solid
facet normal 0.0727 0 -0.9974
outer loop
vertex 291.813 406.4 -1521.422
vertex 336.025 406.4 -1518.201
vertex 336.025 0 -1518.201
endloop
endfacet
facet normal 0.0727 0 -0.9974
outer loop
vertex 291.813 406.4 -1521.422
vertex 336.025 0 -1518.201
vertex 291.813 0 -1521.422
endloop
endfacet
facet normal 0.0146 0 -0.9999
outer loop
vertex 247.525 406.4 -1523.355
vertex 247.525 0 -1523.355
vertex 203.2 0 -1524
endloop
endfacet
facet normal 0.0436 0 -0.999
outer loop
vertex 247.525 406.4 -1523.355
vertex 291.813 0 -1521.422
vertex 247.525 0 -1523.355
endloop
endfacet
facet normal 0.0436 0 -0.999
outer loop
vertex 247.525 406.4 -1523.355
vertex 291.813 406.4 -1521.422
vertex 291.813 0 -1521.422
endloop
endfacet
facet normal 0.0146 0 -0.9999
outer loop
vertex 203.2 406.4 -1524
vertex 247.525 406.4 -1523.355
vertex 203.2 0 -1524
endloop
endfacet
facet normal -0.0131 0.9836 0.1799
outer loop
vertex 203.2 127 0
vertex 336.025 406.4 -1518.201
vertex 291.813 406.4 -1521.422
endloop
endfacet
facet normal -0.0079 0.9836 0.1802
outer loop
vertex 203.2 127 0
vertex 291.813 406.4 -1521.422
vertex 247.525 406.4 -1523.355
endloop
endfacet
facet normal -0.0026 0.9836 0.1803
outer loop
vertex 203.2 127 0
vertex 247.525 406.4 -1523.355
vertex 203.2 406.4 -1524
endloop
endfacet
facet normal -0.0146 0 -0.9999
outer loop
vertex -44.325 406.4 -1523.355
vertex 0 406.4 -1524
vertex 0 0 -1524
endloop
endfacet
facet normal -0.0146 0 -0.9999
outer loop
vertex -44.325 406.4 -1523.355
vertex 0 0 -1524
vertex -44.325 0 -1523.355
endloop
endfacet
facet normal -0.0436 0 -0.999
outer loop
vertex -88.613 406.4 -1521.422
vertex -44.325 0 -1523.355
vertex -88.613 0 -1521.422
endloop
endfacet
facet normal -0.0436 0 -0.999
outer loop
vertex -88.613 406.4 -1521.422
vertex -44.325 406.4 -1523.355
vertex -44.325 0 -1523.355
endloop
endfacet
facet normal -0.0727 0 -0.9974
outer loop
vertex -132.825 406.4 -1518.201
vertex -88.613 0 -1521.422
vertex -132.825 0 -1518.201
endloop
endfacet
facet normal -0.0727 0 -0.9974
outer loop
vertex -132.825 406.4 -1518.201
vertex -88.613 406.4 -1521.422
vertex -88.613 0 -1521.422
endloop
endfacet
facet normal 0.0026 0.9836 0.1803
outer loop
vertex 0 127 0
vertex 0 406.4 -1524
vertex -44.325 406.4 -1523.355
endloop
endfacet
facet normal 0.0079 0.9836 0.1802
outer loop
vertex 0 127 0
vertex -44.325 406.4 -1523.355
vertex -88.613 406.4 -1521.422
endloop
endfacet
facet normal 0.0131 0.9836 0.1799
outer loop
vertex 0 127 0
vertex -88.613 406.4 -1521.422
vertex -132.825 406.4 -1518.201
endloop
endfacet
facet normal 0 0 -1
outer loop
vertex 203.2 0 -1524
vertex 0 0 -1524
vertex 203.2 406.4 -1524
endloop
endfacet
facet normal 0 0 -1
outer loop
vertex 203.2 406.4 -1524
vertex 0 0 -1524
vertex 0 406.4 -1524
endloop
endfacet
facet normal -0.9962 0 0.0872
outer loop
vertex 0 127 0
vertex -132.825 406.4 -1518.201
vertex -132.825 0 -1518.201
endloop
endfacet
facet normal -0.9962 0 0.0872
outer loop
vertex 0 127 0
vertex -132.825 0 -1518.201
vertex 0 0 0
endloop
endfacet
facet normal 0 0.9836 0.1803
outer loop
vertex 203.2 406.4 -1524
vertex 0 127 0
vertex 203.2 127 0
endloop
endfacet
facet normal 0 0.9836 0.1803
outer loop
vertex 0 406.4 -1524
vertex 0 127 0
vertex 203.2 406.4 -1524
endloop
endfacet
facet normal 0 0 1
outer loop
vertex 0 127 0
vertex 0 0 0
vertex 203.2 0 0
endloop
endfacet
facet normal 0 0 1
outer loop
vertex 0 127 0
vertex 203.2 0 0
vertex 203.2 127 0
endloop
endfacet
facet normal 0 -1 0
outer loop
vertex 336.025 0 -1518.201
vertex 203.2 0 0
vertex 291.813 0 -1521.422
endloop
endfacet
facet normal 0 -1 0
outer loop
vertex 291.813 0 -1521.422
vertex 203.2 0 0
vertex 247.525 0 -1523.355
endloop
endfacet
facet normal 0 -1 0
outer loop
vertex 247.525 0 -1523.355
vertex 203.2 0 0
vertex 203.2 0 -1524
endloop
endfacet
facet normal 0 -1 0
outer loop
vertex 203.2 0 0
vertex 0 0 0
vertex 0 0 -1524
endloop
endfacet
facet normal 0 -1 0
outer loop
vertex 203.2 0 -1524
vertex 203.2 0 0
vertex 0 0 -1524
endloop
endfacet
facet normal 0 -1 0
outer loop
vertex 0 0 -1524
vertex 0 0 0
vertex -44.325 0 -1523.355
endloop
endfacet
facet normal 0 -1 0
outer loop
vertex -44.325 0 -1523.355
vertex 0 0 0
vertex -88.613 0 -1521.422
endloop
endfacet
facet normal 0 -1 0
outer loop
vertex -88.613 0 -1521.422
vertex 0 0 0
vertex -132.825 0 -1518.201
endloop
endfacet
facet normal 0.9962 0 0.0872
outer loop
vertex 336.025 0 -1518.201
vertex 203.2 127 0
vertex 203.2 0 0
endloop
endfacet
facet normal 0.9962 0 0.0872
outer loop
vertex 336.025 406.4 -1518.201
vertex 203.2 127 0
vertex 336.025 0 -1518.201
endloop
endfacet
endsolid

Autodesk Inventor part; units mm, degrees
ref_plane "YZ Plane" through (0, 0, 0) normal (1, 0, 0) x (0, 1, 0)
ref_plane "XZ Plane" through (0, 0, 0) normal (0, 1, 0) x (-1, 0, 0)
ref_plane "XY Plane" through (0, 0, 0) normal (0, 0, 1) x (1, 0, 0)
sketch "Sketch1" plane through (0, 0, 0) normal (1, 0, 0) x (0, 1, 0)
  line L0 (0, 0) -> (0, -1524)
  line L1 (0, -1524) -> (406.4, -1524)
  line L2 (0, 0) -> (127, 0)
  line L3 (127, 0) -> (406.4, -1524)
  dimension "d0" = 1524
  dimension "d1" = 406.4
  dimension "d2" = 127
extrude "Extrusion1" add sketch "Sketch1" along normal blind 203.2
sketch "Sketch2" plane through (203.2, 0, 0) normal (1, 0, 0) x (0, 0, -1)
  line L0 (0, 0) -> (1524, 0) projected
  line L1 (1524, 0) -> (1524, 406.4) projected
  line L2 (1524, 406.4) -> (0, 127) projected
  line L3 (0, 127) -> (0, 0) projected
revolve "Revolution1" add sketch "Sketch2" angle 5 about axis through (203.2, 127, 0) along (0, -1, 0)
sketch "Sketch3" plane through (0, 0, 0) normal (-1, 0, 0) x (0, 0, 1)
  line L0 (0, 0) -> (-1524, 0) projected
  line L1 (0, 127) -> (0, 0) projected
  line L2 (-1524, 406.4) -> (0, 127) projected
  line L3 (-1524, 0) -> (-1524, 406.4) projected
revolve "Revolution2" add sketch "Sketch3" angle 5 about axis through (0, 127, 0) along (0, 1, 0)
properties part number "ramp" material "Wood (Cherry)"
